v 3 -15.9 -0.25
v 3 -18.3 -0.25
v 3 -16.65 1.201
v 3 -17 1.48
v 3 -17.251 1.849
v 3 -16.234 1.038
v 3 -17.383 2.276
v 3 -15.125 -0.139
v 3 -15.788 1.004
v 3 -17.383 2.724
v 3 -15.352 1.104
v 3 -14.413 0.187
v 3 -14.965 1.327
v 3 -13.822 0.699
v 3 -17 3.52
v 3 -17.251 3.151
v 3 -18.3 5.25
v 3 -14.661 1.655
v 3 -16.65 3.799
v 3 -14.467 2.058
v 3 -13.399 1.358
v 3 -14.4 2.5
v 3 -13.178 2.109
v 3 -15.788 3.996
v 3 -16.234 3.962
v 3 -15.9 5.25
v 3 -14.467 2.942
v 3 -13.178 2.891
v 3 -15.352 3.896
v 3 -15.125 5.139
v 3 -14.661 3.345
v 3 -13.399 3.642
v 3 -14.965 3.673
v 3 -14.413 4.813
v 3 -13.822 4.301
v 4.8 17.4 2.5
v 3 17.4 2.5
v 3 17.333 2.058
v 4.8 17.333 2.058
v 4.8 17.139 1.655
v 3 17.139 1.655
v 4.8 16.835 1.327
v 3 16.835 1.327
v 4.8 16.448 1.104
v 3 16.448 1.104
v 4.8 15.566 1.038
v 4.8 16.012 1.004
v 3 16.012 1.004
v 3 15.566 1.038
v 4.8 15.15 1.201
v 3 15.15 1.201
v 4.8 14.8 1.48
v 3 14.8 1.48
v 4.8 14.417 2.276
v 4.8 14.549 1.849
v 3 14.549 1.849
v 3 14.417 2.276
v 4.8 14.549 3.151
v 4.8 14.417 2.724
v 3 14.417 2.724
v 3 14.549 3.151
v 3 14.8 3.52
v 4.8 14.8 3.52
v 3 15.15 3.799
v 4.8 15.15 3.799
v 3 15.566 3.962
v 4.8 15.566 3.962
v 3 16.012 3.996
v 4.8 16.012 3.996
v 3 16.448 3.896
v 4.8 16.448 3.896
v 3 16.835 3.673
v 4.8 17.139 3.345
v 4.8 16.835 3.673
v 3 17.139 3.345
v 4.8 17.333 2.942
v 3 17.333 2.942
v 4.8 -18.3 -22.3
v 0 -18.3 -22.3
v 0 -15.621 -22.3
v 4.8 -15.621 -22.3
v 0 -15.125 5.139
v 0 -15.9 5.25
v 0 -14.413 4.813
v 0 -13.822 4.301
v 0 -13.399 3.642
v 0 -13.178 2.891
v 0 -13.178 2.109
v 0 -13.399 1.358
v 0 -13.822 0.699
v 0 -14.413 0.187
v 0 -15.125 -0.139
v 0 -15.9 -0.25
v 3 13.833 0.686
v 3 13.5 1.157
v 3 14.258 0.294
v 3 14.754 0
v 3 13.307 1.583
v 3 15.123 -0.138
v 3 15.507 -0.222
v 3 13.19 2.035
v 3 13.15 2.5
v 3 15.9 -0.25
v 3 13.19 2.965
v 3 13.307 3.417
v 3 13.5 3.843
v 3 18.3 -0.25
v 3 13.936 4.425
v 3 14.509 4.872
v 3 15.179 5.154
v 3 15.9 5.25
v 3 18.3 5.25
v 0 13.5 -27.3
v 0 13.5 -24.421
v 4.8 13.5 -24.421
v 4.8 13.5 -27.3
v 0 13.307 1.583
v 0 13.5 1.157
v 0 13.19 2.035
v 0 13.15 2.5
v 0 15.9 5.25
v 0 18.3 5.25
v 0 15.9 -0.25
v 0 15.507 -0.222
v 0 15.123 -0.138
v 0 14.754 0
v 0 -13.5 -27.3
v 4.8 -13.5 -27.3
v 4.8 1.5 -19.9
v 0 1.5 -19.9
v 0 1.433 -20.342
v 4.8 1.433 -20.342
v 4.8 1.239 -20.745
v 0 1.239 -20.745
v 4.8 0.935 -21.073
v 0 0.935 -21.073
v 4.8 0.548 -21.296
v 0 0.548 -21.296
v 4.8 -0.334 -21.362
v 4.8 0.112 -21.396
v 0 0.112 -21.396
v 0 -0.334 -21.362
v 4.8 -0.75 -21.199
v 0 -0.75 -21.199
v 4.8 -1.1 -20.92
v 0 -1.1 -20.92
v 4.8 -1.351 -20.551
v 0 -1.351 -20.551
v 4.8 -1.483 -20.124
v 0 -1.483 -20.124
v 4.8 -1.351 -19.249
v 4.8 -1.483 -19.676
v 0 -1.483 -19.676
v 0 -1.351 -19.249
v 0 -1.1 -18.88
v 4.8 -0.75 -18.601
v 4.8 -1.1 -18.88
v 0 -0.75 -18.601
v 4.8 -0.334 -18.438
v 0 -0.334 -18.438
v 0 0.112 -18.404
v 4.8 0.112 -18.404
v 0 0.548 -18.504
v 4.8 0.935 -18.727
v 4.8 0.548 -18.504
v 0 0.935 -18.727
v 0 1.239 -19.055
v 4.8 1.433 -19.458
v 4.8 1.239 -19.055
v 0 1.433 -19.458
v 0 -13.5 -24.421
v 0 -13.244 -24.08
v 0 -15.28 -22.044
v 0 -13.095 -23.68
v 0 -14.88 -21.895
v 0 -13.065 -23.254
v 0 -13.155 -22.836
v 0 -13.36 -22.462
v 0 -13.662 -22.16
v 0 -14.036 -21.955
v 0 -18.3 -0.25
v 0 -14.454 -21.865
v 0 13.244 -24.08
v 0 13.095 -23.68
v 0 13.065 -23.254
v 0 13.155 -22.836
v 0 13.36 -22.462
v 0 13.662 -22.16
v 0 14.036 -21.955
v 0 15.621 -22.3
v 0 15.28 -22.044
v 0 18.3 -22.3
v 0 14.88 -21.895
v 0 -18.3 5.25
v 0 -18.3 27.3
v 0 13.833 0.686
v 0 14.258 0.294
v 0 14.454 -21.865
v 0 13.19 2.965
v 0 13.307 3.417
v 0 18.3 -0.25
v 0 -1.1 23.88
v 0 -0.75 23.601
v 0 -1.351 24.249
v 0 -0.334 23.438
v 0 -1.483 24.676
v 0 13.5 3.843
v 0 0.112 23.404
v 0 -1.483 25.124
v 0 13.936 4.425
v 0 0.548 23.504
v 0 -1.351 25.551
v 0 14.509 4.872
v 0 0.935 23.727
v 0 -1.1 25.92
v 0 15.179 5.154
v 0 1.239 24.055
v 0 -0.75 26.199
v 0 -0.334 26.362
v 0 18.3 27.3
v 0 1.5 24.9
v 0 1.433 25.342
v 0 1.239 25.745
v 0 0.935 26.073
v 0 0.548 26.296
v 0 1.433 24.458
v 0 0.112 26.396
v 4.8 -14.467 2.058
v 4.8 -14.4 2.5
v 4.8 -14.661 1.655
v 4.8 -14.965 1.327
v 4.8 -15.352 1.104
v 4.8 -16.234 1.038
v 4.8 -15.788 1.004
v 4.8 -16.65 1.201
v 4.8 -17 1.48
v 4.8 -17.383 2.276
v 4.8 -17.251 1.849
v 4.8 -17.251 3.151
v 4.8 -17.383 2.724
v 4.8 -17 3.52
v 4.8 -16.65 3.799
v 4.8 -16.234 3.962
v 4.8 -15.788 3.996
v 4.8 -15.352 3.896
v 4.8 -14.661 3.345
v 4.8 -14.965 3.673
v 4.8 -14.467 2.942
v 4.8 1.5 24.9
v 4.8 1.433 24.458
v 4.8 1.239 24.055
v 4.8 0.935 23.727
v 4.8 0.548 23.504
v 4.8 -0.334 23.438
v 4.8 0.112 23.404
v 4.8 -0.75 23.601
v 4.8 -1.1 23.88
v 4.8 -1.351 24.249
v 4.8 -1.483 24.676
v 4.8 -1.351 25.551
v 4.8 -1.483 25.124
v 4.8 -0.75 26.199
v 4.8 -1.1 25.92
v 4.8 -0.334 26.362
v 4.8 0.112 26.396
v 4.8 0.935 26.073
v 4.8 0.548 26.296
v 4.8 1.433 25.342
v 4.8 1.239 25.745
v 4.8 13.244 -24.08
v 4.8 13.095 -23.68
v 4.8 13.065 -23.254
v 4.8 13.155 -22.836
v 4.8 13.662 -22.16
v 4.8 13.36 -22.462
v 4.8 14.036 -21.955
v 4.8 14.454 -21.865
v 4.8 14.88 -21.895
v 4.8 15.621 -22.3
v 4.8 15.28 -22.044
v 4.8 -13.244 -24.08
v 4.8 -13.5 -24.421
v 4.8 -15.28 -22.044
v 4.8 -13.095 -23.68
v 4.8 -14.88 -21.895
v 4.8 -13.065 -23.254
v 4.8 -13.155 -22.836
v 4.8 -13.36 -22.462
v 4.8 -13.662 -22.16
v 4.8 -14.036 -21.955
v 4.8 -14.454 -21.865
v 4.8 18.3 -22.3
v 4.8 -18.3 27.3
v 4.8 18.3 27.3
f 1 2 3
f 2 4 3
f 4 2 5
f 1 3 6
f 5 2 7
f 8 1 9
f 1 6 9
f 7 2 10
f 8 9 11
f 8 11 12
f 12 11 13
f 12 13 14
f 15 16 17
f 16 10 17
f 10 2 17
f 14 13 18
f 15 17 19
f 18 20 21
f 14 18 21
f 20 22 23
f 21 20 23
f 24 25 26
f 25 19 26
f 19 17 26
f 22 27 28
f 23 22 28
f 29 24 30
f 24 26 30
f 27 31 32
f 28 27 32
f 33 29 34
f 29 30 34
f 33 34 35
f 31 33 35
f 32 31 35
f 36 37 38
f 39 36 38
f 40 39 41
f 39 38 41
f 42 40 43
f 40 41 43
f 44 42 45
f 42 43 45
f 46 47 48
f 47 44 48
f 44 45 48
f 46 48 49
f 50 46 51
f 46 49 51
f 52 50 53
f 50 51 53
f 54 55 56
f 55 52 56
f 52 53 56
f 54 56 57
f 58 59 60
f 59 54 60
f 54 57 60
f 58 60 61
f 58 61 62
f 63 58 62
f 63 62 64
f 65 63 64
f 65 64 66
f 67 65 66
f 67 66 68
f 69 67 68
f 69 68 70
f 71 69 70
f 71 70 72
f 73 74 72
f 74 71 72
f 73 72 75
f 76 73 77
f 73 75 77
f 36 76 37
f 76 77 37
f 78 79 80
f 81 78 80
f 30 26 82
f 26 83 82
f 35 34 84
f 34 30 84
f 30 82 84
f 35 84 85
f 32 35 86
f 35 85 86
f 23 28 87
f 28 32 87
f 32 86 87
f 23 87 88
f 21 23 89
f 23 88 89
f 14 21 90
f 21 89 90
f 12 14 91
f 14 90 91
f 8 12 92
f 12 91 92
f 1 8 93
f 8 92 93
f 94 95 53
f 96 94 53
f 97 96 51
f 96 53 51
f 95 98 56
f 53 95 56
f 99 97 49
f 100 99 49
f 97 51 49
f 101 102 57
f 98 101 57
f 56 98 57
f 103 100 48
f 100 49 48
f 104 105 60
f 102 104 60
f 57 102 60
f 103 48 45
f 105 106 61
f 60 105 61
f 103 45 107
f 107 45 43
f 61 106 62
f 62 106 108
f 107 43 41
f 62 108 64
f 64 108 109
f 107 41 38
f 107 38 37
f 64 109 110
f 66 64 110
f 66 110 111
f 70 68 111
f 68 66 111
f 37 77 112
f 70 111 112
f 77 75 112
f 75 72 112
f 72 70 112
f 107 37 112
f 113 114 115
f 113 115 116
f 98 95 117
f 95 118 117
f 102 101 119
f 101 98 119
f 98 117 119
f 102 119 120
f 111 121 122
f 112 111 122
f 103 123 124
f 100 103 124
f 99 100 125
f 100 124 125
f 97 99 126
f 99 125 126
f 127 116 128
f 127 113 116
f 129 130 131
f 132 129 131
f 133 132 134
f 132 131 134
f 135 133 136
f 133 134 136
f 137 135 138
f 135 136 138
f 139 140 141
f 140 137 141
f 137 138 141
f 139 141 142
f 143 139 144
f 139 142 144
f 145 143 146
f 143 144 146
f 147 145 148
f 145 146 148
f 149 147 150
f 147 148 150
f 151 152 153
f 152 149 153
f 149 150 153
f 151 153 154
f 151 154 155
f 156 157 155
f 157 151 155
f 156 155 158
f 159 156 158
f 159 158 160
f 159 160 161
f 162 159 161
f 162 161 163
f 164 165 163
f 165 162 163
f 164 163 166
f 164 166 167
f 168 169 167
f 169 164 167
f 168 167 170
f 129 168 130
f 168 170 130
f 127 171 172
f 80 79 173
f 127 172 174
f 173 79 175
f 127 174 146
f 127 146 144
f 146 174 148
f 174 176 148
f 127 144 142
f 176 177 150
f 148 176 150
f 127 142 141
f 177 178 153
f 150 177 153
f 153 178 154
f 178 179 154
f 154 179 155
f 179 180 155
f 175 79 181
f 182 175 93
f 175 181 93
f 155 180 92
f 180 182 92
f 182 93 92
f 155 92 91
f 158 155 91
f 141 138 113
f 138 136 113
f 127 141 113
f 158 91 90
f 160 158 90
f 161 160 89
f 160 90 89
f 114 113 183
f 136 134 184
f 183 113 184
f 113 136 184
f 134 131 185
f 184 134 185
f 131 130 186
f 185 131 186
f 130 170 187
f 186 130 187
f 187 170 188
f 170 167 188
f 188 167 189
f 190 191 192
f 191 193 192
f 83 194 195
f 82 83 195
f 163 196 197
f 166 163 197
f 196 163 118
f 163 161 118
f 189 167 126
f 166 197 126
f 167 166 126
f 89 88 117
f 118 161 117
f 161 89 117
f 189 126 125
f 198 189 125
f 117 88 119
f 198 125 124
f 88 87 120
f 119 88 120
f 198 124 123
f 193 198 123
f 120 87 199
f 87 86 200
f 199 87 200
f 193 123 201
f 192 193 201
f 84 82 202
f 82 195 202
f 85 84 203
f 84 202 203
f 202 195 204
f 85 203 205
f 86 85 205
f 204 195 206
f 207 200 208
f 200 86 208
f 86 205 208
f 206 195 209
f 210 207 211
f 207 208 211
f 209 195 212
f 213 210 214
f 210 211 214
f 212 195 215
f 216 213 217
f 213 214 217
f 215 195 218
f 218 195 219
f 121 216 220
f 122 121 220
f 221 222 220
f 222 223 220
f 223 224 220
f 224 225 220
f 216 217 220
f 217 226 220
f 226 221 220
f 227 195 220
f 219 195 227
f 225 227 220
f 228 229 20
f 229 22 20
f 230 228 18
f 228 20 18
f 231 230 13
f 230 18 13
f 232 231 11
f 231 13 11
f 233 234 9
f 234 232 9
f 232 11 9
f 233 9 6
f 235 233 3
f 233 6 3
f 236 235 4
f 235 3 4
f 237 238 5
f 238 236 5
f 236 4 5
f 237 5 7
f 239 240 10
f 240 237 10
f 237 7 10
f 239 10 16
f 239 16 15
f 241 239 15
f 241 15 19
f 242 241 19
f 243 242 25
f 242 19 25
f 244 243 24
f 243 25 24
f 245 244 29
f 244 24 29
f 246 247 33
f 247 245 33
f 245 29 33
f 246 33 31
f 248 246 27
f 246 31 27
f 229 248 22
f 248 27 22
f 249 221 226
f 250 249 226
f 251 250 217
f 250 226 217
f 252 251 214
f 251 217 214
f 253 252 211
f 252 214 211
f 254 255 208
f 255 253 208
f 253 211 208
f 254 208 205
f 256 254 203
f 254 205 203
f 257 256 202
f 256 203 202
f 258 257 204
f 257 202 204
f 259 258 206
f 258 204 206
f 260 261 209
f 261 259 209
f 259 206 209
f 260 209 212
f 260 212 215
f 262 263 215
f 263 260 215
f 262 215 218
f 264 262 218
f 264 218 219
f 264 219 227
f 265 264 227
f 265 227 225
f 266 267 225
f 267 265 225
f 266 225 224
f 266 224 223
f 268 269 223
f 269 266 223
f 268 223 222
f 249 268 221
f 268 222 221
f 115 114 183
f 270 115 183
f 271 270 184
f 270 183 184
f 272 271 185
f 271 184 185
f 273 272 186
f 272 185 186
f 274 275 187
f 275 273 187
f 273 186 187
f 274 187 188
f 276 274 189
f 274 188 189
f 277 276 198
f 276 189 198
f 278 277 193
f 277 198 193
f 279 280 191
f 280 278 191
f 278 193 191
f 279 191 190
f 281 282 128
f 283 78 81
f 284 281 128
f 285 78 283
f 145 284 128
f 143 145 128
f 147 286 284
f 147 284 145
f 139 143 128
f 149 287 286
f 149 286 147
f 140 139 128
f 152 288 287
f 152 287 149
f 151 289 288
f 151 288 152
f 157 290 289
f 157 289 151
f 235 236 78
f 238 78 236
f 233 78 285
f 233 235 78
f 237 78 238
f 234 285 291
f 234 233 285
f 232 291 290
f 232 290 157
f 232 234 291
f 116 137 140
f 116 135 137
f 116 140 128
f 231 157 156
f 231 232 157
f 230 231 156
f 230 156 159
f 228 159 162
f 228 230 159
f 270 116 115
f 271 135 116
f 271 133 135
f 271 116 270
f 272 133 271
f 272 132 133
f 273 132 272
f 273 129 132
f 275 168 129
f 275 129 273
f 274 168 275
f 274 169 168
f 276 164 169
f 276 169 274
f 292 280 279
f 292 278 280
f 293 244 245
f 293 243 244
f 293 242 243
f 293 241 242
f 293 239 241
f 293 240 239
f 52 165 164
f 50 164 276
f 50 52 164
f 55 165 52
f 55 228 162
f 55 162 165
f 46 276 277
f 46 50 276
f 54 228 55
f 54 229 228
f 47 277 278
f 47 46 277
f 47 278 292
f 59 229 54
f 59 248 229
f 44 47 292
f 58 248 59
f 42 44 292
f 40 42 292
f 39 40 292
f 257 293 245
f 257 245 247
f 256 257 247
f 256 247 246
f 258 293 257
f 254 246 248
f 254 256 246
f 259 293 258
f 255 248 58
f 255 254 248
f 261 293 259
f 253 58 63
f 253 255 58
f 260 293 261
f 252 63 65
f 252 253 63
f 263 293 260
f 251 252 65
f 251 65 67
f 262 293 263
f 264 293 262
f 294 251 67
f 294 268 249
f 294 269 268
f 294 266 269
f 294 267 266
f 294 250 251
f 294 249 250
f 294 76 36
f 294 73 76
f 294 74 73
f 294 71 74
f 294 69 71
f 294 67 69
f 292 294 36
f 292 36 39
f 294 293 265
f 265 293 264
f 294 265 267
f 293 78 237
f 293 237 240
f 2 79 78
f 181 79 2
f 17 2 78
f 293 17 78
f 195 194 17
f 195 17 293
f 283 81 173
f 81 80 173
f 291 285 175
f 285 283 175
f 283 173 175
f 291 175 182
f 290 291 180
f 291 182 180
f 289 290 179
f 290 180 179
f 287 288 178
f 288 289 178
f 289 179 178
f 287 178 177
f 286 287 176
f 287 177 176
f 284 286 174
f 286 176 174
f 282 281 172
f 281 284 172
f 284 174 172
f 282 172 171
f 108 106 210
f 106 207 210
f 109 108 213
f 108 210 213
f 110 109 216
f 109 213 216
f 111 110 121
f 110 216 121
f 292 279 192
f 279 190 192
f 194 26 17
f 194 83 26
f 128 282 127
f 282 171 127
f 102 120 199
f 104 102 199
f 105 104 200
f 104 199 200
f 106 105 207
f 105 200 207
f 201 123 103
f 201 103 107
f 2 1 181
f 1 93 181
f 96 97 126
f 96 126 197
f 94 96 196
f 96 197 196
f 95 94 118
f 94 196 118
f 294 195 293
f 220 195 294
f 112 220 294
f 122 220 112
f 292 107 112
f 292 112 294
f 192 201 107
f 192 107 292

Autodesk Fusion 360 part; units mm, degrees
sketch "Sketch1" plane through (0, 0, 0) normal (1, 0, 0) x (0, 1, 0)
  line L0 (-18.3, 27.3) -> (18.3, 27.3)
  line L1 (18.3, 27.3) -> (18.3, -22.3)
  line L2 (13.5, -27.3) -> (-13.5, -27.3)
  line L3 (-18.3, -22.3) -> (-18.3, 27.3)
  line L4 (0, 0) -> (0, 27.3) construction
  line L5 (-13.5, 27.3) -> (-13.5, -22.3) construction
  line L6 (13.5, 27.3) -> (13.5, -22.3) construction
  line L7 (-18.3, 22.5) -> (18.3, 22.5) construction
  line L8 (-18.3, -17.5) -> (18.3, -17.5) construction
  line L9 (-13.5, -22.3) -> (13.5, -22.3) construction
  line L10 (-18.3, 2.5) -> (18.3, 2.5) construction
  line L11 (0, 0) -> (0, -19.9) construction
  circle A0 centre (0, -19.9) radius 1.5
  circle A1 centre (-15.9, 2.5) radius 1.5
  circle A2 centre (15.9, 2.5) radius 1.5
  circle A3 centre (0, 24.9) radius 1.5
  line L12 (-18.3, -22.3) -> (-15.6213, -22.3)
  line L13 (-13.5, -24.4213) -> (-13.5, -27.3)
  line L14 (13.5, -24.4213) -> (13.5, -27.3)
  line L15 (15.6213, -22.3) -> (18.3, -22.3)
  line L16 (-18.3, -27.3) -> (-18.3, -22.3) construction
  line L17 (-13.5, -27.3) -> (-18.3, -27.3) construction
  line L18 (18.3, -27.3) -> (13.5, -27.3) construction
  line L19 (0, 0) -> (18.3, 0)
  line L20 (18.3, -22.3) -> (18.3, -27.3) construction
  line L21 (-13.5, -22.3) -> (-14.5607, -23.3607) construction
  arc A4 (-13.5, -24.4213) -> (-15.6213, -22.3) centre (-14.5607, -23.3607) ccw
  arc A5 (-15.6213, -22.3) -> (-13.5, -24.4213) centre (-14.5607, -23.3607) ccw construction
  line L22 (-13.5, -22.3) -> (-13.5, -24.4213) construction
  line L23 (-15.6213, -22.3) -> (-13.5, -22.3) construction
  line L24 (13.5, -22.3) -> (14.5607, -23.3607) construction
  arc A6 (15.6213, -22.3) -> (13.5, -24.4213) centre (14.5607, -23.3607) ccw
  arc A7 (13.5, -24.4213) -> (15.6213, -22.3) centre (14.5607, -23.3607) ccw construction
  line L25 (13.5, -22.3) -> (15.6213, -22.3) construction
  line L26 (13.5, -22.3) -> (13.5, -24.4213) construction
  line L27 (-15.9, -0.25) -> (-18.3, -0.25)
  line L28 (-15.9, 5.25) -> (-18.3, 5.25)
  arc A8 (-15.9, -0.25) -> (-15.9, 5.25) centre (-15.9, 2.5) ccw
  arc A9 (-15.9, 5.25) -> (-18.3, 3.8426) centre (-15.9, 2.5) ccw construction
  arc A10 (-18.3, 3.8426) -> (-18.3, 1.1574) centre (-15.9, 2.5) ccw construction
  arc A11 (-18.3, 1.1574) -> (-15.9, -0.25) centre (-15.9, 2.5) ccw construction
  line L29 (15.9, 5.25) -> (18.3, 5.25)
  line L30 (15.9, -0.25) -> (18.3, -0.25)
  arc A12 (15.9, -0.25) -> (15.9, 5.25) centre (15.9, 2.5) ccw construction
  arc A13 (14.7544, 0) -> (15.9, -0.25) centre (15.9, 2.5) ccw
  arc A14 (13.5, 1.1574) -> (14.7544, 0) centre (15.9, 2.5) ccw
  arc A15 (13.15, 2.5) -> (13.5, 1.1574) centre (15.9, 2.5) ccw
  arc A16 (13.5, 3.8426) -> (13.15, 2.5) centre (15.9, 2.5) ccw
  arc A17 (15.9, 5.25) -> (13.5, 3.8426) centre (15.9, 2.5) ccw
  point P0 (18.3, 0)
  dimension "d20" = 4.8
  dimension "d21" = 4.8
  dimension "d22" = 4.8
  dimension "d23" = 27
  dimension "d24" = 4.8
  dimension "d25" = 5
  dimension "d26" = 40
  dimension "d27" = 20
  dimension "d28" = 2.4
  dimension "d29" = 3
  dimension "d30" = 3
  dimension "d31" = 3
  dimension "d32" = 3
  dimension "d33" = 2.4
  dimension "d34" = 2.4
  dimension "d35" = 2.4
  dimension "d38" = 2.5
  dimension "d39" = 1.5
  dimension "d40" = 45
  dimension "d41" = 3
  dimension "d42" = 1.5
  dimension "d43" = 45
  dimension "d44" = 3
  dimension "d45" = 5.5
  dimension "d46" = 5.5
extrude "Extrude1" add sketch "Sketch1" along normal blind 4.8
extrude "Extrude2" cut sketch "Sketch1" along normal blind 3 contours L3 L27 L28 A8 | L1 L19 L29 A14 A15 A16 A17 | L1 L19 L30 A13
